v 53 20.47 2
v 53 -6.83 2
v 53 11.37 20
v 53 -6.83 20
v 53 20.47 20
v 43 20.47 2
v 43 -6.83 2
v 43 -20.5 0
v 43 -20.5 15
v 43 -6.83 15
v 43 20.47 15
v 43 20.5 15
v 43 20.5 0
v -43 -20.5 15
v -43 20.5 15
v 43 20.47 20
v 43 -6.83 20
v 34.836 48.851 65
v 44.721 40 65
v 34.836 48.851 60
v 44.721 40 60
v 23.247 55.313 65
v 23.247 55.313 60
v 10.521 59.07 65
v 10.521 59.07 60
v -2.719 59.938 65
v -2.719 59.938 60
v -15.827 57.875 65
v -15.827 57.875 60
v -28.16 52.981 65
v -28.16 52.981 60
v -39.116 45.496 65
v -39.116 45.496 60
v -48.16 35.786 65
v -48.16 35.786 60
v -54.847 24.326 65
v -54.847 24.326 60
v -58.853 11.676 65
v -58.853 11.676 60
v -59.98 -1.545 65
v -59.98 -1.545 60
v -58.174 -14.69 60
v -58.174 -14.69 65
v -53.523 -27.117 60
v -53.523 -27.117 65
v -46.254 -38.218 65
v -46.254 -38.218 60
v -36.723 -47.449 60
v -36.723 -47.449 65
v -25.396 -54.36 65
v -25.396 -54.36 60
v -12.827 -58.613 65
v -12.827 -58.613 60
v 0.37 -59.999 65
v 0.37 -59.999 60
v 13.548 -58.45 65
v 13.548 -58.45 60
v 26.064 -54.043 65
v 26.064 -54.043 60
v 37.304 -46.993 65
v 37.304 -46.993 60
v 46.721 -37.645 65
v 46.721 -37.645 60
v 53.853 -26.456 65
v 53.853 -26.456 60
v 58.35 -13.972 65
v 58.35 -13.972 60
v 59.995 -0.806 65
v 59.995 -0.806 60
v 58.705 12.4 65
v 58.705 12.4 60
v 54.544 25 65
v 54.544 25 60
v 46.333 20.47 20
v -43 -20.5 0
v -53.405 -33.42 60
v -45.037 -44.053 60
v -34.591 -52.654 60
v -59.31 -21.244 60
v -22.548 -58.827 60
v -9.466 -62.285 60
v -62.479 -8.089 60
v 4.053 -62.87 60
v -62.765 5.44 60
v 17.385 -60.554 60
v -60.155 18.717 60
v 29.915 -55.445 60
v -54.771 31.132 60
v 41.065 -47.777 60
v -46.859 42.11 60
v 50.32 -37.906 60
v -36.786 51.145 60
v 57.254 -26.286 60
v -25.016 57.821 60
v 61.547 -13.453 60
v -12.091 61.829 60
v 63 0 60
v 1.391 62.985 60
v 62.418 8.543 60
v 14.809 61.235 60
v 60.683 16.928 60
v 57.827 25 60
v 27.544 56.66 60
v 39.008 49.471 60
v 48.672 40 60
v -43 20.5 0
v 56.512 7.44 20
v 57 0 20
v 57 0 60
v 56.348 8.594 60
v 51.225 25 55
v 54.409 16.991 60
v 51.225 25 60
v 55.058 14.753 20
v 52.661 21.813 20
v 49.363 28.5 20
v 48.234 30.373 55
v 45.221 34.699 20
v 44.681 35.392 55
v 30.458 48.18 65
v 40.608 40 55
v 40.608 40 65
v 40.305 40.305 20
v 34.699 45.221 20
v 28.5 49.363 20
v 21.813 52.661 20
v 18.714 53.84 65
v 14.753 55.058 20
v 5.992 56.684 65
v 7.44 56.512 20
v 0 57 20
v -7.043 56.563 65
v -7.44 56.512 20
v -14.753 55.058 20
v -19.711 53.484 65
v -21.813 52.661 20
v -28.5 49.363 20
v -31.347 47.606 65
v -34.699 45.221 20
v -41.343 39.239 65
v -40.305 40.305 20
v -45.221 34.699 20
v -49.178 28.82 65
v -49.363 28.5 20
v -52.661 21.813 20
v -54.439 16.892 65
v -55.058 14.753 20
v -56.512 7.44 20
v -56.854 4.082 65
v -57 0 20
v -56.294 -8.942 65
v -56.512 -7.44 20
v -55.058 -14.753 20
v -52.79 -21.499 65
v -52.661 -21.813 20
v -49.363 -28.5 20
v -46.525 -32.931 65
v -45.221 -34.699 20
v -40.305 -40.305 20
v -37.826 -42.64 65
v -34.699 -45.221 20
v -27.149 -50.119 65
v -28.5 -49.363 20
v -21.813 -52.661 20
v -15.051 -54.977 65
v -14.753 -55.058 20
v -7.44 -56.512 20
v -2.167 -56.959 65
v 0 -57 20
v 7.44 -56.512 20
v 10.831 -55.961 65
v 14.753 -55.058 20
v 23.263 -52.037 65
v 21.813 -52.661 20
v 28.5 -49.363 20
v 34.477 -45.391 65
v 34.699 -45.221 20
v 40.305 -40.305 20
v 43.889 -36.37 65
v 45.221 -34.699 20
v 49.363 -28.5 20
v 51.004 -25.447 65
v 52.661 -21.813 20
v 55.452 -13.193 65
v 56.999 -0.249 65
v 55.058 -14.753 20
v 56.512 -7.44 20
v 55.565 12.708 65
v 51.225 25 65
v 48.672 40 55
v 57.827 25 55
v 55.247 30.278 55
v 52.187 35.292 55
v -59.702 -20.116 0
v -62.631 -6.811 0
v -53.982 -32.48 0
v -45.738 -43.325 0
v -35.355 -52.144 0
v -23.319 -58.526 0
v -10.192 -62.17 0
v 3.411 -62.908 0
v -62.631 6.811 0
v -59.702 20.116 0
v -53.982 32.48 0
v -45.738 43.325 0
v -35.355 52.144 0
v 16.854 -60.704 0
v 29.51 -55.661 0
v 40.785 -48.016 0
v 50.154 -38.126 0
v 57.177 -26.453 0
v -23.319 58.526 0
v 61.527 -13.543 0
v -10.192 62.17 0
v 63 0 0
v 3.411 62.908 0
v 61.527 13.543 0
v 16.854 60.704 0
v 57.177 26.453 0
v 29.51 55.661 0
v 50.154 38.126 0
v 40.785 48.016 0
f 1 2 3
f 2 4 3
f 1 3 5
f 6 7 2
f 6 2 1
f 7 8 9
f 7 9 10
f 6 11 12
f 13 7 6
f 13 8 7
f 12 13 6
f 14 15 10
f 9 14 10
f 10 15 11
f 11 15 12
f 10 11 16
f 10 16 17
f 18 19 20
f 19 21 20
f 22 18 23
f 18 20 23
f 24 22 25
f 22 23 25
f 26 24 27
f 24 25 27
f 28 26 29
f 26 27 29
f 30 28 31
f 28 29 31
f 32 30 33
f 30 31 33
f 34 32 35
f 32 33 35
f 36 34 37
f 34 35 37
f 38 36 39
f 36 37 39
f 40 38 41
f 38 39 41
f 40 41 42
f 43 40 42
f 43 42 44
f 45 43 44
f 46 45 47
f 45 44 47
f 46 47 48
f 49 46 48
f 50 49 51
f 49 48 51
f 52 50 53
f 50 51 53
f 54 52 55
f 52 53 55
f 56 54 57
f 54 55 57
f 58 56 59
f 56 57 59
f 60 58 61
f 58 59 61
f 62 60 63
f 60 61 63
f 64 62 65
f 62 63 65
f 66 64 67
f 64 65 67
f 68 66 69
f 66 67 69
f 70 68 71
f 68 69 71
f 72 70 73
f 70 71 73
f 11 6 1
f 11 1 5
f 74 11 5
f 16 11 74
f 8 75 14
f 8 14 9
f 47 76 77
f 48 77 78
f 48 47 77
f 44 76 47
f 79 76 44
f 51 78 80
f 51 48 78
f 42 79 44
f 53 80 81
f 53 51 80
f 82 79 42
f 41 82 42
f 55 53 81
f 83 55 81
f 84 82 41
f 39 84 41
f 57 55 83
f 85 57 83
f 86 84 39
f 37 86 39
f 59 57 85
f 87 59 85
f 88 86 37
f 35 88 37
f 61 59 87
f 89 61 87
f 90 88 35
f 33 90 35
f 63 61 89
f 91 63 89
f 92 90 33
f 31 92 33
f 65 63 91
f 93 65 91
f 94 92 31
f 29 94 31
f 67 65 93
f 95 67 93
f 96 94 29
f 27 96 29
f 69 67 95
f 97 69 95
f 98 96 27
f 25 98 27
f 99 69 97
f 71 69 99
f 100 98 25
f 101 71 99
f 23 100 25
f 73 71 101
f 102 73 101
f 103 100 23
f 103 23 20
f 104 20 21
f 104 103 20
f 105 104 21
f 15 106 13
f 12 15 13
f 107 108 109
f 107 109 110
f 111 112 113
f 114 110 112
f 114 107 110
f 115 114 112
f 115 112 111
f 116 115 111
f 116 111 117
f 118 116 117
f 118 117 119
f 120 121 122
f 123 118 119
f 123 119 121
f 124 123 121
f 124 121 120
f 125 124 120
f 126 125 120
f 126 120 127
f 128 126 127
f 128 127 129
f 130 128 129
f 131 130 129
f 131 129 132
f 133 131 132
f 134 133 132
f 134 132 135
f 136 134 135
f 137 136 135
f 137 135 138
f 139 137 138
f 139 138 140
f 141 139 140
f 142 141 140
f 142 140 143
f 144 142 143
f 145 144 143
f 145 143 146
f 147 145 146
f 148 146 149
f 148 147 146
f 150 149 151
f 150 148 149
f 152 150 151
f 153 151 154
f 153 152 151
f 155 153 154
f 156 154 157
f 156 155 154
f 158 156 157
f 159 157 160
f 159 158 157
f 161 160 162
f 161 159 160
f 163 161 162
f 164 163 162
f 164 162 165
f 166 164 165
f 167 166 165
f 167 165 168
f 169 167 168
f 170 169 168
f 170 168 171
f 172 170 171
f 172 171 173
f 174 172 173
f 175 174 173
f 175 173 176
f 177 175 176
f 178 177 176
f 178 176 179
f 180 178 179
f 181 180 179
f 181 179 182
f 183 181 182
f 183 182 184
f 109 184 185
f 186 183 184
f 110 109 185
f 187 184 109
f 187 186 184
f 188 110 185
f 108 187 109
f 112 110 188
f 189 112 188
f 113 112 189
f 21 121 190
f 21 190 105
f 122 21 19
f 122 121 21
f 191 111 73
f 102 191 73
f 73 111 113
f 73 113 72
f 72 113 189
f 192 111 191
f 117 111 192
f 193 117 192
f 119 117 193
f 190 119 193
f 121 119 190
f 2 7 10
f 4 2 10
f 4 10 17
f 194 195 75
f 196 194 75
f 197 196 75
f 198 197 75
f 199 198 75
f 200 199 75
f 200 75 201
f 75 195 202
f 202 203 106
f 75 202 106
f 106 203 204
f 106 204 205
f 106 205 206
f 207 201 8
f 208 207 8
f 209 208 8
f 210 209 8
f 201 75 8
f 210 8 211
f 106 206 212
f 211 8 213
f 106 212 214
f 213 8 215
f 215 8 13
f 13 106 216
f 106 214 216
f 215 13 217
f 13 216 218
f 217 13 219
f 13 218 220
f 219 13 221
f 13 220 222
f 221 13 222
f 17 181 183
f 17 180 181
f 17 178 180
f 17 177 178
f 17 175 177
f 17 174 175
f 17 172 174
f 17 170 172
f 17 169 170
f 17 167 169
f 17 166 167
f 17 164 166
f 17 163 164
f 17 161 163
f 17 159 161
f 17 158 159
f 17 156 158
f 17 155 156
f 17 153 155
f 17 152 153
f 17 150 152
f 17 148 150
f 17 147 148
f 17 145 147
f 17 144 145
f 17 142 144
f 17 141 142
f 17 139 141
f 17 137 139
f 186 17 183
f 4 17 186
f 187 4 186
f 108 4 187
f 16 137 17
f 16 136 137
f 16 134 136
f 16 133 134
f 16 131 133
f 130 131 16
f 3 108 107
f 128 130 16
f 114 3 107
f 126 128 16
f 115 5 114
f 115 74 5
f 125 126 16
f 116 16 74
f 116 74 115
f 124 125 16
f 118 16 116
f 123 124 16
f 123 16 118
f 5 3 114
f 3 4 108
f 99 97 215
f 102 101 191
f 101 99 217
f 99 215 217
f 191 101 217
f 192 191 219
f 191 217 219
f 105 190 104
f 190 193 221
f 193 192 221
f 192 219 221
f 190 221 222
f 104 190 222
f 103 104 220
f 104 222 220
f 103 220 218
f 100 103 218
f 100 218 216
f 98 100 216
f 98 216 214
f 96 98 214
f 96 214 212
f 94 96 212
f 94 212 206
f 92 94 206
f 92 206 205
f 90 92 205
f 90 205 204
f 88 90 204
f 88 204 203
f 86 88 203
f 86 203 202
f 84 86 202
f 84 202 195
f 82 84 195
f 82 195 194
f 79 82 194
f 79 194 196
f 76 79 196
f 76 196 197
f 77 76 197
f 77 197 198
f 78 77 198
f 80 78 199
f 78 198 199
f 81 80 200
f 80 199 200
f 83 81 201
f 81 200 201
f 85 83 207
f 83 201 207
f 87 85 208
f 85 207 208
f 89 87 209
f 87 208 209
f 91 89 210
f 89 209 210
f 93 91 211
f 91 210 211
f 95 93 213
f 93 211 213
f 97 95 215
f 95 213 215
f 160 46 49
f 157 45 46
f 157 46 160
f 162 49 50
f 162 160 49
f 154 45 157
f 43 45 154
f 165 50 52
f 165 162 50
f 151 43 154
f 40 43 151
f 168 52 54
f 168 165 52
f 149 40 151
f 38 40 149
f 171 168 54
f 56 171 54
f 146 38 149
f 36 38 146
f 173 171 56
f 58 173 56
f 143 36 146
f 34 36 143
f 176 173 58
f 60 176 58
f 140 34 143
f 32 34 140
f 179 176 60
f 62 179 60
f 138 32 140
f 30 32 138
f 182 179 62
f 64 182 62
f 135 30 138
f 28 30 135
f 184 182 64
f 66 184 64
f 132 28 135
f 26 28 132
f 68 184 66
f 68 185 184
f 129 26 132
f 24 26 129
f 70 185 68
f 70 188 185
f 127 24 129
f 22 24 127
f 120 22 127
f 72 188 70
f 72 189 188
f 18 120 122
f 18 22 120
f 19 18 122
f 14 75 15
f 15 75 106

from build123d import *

# Parameters (mm, degrees)
F0_R      = 63
F0_R_2    = 60
F2_DEPTH  = 60
F1_R      = 60
F1_R_2    = 57
F3_DEPTH  = 65
F4_R      = 57
F5_DEPTH  = 60
F7_R      = 57
F8_DEPTH  = 40
F9_W      = 15
F9_H      = 10
F10_DEPTH = 279.5
F11_DEPTH = 71.5
F13_R     = 63
F14_DEPTH = 20
F15_W     = 86
F15_H     = 41
F16_DEPTH = 15
F17_W     = 27.3
F17_H     = 13
F18_DEPTH = 53
F20_DEPTH = 25


# Not quite as in the source:
# - a feature names something its author has since deleted; it is built from what else it names


with BuildPart() as f2:
    # F0 (on Top) → F2 (new body)
    with BuildSketch(Plane.XY):
        Circle(F0_R)
        Circle(F0_R_2, mode=Mode.SUBTRACT)
    extrude(amount=F2_DEPTH)

    # F1 (on Top) → F3 (join)
    with BuildSketch(Plane.XY):
        Circle(F1_R)
        Circle(F1_R_2, mode=Mode.SUBTRACT)
    extrude(amount=F3_DEPTH)

    # F4 (on Top) → F5 (join)
    with BuildSketch(Plane.XY):
        Circle(F4_R)
    extrude(amount=F5_DEPTH)

    # F7 (on offset) → F8 (cut)
    with BuildSketch(Plane.XY.offset(45)):
        Circle(F7_R)
    extrude(amount=-F8_DEPTH, mode=Mode.SUBTRACT)

    # F9 (on Right) → F10 (cut)
    with BuildSketch(Plane.YZ):
        with Locations((32.5, 60)):
            Rectangle(F9_W, F9_H)
    extrude(amount=F10_DEPTH, mode=Mode.SUBTRACT)

    # F1 (on Top) → F11 (cut)
    with BuildSketch(Plane.XY):
        Circle(F1_R_2)
    extrude(amount=F11_DEPTH, mode=Mode.SUBTRACT)

    # F13 (on Top) → F14 (join)
    with BuildSketch(Plane.XY):
        Circle(F13_R)
    extrude(amount=F14_DEPTH)

    # F15 (on Top) → F16 (cut)
    with BuildSketch(Plane.XY):
        Rectangle(F15_W, F15_H)
    extrude(amount=F16_DEPTH, mode=Mode.SUBTRACT)

    # F17 (on Right) → F18 (cut)
    with BuildSketch(Plane.YZ):
        with Locations((6.82, 8.5)):
            Rectangle(F17_W, F17_H)
    extrude(amount=F18_DEPTH, mode=Mode.SUBTRACT)

    # F19 (on offset) → F20 (cut)
    with BuildSketch(Plane.XY.offset(15)):
        Polygon((43, 20.47), (43, 0), (43, -6.83), (53, -6.83), (53, 20.47), align=None)
    extrude(amount=F20_DEPTH, mode=Mode.SUBTRACT)


solid = f2.part
